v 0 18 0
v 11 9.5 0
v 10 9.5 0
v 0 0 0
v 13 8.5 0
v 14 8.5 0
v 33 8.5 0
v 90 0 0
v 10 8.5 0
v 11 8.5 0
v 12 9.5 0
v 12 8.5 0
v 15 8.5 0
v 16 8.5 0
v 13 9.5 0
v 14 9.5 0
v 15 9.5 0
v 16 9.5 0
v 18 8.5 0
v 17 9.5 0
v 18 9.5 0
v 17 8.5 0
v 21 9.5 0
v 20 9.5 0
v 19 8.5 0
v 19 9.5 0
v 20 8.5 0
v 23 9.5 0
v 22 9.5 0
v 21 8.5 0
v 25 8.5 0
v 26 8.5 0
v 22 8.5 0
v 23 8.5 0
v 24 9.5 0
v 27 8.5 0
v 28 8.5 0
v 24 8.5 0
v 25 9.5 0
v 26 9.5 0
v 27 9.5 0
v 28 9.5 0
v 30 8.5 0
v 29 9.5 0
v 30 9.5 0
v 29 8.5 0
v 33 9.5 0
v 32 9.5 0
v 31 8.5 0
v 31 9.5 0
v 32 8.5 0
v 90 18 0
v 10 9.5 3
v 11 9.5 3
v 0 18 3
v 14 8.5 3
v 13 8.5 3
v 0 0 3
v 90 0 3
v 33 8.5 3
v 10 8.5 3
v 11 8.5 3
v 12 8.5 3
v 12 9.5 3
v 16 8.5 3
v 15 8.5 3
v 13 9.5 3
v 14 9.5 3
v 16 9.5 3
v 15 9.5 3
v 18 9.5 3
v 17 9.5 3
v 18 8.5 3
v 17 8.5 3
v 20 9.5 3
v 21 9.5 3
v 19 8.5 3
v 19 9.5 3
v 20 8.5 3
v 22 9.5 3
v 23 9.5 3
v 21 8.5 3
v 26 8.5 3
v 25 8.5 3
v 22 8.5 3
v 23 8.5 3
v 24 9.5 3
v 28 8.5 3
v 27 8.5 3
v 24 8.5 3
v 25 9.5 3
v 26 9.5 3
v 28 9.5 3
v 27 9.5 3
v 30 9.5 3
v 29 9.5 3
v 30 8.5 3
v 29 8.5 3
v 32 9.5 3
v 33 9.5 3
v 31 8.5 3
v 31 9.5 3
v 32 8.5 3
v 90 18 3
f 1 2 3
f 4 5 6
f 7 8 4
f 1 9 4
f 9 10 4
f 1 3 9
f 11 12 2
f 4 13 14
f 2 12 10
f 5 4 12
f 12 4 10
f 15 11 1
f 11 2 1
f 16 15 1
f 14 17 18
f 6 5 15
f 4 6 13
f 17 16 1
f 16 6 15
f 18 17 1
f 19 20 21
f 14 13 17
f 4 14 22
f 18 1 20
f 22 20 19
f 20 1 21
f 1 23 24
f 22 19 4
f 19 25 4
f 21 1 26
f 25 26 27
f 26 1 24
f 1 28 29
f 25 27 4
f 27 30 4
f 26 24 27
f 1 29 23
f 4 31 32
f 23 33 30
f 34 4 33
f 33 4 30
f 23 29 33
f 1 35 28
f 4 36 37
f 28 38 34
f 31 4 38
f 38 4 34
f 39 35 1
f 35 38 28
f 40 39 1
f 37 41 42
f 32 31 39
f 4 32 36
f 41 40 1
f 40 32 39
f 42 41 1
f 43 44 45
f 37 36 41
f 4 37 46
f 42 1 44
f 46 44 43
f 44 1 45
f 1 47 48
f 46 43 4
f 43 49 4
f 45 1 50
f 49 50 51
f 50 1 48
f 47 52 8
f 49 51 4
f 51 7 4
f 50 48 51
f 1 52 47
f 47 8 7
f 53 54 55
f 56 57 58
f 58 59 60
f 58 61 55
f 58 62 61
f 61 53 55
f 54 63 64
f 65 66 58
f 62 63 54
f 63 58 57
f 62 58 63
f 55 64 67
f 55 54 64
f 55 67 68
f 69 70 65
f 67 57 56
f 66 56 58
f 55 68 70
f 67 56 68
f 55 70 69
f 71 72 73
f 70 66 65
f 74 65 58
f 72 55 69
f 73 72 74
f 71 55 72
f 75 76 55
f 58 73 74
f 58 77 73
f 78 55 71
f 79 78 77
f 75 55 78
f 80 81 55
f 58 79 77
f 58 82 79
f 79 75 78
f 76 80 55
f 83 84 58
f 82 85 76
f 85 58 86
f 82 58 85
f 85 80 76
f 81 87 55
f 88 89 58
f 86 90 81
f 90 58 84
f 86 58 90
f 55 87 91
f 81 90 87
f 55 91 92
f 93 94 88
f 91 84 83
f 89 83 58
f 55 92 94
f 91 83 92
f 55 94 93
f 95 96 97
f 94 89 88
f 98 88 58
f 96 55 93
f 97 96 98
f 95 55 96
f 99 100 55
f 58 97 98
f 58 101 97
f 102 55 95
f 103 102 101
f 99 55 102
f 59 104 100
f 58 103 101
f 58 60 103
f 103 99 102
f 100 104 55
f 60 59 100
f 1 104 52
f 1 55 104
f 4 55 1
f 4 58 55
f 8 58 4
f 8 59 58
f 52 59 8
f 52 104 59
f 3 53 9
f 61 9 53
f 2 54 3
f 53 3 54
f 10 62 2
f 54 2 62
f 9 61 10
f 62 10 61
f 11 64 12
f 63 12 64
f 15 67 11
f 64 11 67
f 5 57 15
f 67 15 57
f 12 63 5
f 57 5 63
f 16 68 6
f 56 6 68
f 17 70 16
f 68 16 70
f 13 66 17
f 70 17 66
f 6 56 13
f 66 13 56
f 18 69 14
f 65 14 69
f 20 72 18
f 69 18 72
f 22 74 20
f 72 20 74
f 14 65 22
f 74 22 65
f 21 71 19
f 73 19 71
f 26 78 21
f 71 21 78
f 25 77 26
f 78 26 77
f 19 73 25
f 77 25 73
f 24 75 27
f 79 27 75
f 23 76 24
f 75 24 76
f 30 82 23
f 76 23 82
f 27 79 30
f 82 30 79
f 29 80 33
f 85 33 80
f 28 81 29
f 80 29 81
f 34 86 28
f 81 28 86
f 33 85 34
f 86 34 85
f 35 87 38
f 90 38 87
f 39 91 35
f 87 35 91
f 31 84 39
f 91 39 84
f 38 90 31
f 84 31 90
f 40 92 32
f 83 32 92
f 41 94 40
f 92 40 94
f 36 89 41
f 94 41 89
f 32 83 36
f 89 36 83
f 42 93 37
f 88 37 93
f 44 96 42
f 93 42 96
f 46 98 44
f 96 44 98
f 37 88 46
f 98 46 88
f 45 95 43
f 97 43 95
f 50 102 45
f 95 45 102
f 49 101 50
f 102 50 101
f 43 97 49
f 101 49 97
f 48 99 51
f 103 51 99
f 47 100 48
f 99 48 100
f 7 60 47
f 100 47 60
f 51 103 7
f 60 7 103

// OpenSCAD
/*
  Compliant hinge test strip.
*/
strip_w = 18; strip_l = 90; th = 3; slot_w = 1.0; slot_gap = 1.0; slots = 12;
linear_extrude(height=th)
difference(){
  square([strip_l, strip_w]);
  for(i=[0:slots-1]) translate([10 + i*(slot_w+slot_gap), (strip_w-slot_w)/2]) square([slot_w, slot_w]);
}
